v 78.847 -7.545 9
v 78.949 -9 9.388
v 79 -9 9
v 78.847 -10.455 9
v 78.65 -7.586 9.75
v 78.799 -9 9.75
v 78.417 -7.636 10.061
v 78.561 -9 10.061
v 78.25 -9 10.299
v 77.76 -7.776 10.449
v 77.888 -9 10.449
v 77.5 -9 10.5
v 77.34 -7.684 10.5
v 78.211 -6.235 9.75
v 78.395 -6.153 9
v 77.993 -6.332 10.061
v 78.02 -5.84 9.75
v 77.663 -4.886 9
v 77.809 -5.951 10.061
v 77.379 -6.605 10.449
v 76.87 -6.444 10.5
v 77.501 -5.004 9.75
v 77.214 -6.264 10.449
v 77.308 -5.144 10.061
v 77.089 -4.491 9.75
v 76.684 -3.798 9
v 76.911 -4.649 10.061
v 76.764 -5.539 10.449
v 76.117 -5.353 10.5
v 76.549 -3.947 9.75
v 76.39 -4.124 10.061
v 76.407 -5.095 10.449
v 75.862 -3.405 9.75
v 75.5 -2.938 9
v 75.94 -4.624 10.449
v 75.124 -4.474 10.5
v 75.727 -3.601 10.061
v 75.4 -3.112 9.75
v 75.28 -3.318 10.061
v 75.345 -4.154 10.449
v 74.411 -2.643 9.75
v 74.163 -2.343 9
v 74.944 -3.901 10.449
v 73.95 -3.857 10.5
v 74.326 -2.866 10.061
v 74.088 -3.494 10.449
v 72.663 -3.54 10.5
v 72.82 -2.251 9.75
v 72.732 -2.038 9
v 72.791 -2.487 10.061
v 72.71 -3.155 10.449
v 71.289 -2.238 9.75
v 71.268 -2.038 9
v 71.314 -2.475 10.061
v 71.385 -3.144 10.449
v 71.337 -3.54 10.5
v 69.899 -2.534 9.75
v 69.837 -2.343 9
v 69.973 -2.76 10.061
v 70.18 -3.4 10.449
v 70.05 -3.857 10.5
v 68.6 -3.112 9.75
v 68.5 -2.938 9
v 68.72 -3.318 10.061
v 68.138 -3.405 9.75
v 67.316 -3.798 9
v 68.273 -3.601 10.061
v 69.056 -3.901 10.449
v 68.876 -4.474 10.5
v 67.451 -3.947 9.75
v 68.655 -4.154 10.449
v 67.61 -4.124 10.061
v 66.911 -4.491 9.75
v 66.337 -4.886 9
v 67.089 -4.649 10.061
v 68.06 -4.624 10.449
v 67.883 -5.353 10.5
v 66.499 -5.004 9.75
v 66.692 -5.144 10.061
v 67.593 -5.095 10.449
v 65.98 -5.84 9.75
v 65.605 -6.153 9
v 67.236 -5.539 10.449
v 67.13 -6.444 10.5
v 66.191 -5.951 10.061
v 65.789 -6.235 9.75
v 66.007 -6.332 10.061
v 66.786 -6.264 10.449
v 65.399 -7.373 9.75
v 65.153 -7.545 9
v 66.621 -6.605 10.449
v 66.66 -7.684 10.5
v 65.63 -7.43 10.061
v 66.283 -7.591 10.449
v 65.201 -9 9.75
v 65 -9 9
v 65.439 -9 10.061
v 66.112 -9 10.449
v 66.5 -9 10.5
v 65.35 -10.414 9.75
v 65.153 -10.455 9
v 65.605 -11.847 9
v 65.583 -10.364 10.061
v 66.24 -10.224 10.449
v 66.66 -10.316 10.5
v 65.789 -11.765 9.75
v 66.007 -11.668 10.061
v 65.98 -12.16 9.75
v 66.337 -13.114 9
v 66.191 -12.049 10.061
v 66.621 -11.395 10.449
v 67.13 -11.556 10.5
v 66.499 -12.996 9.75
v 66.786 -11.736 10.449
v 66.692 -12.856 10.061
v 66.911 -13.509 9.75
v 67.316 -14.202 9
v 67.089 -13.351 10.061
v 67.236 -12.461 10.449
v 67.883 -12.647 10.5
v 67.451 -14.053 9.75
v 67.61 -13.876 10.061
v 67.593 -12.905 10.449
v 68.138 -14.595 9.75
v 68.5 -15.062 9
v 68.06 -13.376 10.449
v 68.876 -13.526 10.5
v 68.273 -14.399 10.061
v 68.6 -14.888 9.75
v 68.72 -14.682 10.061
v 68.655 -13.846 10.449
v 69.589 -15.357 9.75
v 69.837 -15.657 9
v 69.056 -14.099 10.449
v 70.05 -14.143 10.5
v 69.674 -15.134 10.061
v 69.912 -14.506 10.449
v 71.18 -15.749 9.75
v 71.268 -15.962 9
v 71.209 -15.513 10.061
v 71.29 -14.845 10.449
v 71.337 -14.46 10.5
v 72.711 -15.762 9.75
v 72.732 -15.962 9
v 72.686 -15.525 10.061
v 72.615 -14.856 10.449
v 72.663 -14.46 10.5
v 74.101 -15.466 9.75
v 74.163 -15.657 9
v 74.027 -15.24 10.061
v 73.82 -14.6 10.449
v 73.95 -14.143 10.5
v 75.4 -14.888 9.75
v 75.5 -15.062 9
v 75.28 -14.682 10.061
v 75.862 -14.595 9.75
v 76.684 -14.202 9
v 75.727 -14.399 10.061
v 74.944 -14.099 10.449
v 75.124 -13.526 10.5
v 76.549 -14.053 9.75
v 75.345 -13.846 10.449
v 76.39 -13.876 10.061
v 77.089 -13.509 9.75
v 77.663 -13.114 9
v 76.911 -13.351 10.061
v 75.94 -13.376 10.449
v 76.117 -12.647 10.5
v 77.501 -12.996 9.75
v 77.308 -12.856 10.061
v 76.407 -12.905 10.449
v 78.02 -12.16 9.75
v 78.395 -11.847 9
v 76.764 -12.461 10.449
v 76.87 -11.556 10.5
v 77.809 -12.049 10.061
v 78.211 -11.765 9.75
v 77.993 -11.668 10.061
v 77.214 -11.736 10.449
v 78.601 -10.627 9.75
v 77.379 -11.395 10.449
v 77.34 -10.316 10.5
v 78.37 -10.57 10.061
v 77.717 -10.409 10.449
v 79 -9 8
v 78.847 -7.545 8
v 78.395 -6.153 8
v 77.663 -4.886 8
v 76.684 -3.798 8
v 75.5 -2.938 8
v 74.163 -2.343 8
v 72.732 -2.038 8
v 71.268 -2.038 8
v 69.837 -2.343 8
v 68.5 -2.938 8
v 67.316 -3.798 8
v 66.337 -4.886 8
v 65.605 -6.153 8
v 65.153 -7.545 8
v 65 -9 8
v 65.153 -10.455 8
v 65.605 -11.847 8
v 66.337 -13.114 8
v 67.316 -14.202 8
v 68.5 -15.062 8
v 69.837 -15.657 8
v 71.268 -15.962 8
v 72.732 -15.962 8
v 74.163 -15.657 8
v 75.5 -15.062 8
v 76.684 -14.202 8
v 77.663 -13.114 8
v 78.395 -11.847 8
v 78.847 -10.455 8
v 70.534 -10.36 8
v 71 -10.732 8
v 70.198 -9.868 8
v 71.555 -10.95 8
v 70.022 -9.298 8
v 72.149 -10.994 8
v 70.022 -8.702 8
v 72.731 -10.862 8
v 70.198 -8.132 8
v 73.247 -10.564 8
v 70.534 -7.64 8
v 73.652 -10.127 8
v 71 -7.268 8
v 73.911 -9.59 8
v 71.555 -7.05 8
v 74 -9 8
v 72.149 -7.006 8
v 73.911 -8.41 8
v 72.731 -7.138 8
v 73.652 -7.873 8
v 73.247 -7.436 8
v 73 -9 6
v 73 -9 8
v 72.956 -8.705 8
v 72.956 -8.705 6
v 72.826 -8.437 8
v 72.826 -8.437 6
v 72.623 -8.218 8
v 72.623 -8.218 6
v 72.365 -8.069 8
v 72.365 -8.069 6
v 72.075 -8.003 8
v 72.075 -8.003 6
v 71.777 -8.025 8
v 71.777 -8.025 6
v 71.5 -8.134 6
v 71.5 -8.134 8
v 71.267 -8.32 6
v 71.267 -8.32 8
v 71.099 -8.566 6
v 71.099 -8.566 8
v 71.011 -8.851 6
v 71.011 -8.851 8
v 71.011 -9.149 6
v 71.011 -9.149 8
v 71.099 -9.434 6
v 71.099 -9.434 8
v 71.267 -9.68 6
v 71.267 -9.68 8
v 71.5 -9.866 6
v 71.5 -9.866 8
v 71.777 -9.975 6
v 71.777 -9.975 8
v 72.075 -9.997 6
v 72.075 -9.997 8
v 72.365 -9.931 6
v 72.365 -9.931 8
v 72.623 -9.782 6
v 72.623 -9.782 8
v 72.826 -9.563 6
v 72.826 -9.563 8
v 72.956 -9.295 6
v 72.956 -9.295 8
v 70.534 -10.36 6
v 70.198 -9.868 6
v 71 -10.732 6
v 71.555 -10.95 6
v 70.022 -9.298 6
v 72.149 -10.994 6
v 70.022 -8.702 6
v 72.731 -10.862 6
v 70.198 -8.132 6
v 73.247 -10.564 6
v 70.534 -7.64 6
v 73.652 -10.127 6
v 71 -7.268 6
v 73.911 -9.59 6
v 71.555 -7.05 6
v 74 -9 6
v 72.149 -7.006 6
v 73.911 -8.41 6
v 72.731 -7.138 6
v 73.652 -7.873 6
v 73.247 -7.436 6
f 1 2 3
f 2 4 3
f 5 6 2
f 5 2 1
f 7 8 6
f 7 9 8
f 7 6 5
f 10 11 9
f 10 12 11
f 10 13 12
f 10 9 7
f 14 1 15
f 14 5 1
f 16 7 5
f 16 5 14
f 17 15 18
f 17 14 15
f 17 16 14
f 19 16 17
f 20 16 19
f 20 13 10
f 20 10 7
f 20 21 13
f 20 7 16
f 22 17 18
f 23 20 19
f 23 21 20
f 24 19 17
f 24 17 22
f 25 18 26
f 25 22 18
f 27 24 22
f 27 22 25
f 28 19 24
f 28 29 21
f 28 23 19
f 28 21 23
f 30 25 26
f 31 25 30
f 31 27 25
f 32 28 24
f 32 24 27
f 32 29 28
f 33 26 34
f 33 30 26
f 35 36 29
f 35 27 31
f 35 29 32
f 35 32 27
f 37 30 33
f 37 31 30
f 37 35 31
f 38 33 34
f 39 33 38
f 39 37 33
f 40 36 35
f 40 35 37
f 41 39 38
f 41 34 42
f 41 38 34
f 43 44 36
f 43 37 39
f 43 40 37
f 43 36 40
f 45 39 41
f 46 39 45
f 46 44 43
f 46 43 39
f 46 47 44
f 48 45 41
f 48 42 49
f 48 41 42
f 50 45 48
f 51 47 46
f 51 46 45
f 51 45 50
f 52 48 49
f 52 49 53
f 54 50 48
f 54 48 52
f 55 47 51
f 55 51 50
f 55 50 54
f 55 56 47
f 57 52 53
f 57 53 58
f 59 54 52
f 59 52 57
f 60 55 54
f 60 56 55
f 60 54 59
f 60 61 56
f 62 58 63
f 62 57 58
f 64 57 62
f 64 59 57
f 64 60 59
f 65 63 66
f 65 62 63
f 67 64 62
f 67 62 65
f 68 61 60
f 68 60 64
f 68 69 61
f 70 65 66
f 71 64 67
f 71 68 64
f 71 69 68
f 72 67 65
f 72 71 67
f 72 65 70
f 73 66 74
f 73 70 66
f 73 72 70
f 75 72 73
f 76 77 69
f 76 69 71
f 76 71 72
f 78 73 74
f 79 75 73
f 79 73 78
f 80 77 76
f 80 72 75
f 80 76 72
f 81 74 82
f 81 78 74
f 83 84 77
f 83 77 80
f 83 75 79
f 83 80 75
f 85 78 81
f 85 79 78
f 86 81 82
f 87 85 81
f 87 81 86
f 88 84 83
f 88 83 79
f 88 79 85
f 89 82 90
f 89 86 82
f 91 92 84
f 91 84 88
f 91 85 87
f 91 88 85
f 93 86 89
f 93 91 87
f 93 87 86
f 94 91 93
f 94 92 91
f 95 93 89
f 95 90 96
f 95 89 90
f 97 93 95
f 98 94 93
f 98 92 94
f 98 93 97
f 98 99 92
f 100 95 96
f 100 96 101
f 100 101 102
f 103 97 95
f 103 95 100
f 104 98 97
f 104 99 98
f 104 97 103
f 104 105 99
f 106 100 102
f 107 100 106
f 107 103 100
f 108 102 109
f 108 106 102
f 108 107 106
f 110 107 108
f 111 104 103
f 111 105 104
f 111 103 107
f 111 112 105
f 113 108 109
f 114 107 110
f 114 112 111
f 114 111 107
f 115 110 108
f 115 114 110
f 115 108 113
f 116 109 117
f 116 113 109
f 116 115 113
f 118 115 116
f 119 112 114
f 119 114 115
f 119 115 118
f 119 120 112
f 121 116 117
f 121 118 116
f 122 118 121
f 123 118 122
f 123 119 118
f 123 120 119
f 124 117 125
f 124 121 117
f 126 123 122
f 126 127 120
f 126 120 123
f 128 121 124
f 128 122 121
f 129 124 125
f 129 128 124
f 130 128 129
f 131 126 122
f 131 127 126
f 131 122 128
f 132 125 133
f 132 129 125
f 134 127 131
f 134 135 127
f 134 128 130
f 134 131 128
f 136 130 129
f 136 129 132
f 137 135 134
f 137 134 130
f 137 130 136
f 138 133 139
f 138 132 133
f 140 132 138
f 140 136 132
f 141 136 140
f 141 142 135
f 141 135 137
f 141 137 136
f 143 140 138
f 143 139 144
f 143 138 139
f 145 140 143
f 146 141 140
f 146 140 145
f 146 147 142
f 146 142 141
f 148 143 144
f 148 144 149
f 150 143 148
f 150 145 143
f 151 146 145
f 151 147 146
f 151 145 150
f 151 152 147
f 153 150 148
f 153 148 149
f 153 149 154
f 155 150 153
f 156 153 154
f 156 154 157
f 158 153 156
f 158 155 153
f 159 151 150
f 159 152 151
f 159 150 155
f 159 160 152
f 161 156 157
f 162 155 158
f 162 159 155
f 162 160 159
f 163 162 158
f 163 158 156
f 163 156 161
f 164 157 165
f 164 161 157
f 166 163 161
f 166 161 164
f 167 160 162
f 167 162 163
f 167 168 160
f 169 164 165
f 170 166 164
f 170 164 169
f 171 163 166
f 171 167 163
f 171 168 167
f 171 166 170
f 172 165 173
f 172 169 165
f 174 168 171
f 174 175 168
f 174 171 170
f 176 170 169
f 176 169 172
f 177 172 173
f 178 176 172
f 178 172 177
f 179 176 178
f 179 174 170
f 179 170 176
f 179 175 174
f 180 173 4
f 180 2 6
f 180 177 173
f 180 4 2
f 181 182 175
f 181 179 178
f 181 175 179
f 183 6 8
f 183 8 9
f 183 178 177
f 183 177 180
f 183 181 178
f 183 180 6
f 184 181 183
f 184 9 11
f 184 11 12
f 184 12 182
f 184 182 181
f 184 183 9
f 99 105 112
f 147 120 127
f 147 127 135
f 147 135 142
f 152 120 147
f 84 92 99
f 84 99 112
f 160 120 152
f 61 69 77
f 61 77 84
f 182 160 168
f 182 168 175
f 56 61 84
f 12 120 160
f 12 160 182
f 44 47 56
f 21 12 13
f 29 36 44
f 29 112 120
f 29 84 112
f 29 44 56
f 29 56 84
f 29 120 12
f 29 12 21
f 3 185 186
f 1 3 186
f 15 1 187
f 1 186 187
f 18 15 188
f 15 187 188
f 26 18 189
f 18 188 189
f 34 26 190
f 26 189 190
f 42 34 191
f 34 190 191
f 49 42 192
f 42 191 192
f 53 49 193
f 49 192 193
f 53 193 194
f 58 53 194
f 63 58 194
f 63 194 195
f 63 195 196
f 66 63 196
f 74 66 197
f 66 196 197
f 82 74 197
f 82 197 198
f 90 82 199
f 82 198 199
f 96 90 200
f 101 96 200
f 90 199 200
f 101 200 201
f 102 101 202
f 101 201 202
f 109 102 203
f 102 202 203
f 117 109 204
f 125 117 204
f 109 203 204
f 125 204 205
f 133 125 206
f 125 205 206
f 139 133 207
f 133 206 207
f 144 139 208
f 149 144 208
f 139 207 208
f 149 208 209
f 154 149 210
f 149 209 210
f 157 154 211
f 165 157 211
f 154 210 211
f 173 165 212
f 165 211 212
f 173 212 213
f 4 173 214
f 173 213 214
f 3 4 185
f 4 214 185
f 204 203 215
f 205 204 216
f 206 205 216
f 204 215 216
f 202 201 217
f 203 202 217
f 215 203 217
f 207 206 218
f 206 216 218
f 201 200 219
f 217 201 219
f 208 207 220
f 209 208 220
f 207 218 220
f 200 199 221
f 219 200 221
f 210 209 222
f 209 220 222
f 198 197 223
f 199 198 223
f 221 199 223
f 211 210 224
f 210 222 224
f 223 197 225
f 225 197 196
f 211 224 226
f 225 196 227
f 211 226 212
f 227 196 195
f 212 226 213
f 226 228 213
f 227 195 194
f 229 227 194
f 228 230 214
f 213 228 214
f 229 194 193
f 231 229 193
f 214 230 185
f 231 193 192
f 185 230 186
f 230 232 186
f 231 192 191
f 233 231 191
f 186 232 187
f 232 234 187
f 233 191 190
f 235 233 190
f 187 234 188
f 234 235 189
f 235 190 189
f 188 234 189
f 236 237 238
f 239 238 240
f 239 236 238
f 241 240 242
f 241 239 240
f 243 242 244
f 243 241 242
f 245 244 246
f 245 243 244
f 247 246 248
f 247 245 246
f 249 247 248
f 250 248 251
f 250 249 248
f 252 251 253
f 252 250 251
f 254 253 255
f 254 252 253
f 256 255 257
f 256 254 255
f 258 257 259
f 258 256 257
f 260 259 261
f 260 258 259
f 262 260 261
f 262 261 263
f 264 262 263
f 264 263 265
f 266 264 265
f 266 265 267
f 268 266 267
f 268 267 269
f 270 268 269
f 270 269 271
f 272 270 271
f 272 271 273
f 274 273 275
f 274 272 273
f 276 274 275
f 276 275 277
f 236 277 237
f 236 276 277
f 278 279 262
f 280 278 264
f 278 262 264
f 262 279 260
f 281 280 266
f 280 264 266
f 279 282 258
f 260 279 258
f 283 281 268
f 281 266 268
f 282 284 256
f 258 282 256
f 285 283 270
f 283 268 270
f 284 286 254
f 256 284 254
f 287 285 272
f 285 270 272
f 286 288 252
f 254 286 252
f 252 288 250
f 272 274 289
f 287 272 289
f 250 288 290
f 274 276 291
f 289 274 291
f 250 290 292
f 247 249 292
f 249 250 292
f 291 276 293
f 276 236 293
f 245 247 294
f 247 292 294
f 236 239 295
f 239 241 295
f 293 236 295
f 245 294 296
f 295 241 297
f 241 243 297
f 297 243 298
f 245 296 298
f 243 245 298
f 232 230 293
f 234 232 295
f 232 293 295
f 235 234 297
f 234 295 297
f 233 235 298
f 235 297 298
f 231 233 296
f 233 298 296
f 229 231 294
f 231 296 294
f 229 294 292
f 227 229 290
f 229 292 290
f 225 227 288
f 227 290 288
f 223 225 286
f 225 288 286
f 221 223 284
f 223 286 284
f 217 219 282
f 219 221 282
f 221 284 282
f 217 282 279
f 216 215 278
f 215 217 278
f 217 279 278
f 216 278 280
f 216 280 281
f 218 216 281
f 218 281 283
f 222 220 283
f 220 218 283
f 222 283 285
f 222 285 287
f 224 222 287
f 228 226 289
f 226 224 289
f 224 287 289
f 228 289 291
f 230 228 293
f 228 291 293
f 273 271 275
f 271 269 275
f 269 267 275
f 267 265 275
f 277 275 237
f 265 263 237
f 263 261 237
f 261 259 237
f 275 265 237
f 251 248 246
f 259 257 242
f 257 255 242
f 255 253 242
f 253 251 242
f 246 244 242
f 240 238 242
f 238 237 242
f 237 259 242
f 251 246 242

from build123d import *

# Parameters (mm, degrees)
CYLINDER085_R     = 1
CYLINDER085_DEPTH = 3.5
CYLINDER087_R     = 2
CYLINDER087_DEPTH = 3.5
CYLINDER086_R     = 7
CYLINDER086_DEPTH = 2.5
FILLET054_R       = 1.5


with BuildPart() as cylinder166:
    # Cylinder085 → Cylinder085 (new body)
    with BuildSketch(Plane(origin=(46, -9, 6), x_dir=(1, 0, 0), z_dir=(0, 0, 1))):
        Circle(CYLINDER085_R)
    extrude(amount=CYLINDER085_DEPTH)


with BuildPart() as cut111:
    # Cylinder087 → Cylinder087 (new body)
    with BuildSketch(Plane(origin=(46, -9, 6), x_dir=(1, 0, 0), z_dir=(0, 0, 1))):
        Circle(CYLINDER087_R)
    extrude(amount=CYLINDER087_DEPTH)

    # Cut111: cut Cylinder166
    add(cylinder166.part, mode=Mode.SUBTRACT)


with BuildPart() as fusion066:
    # Cylinder086 → Cylinder086 (new body)
    with BuildSketch(Plane(origin=(46, -9, 8), x_dir=(1, 0, 0), z_dir=(0, 0, 1))):
        Circle(CYLINDER086_R)
    extrude(amount=CYLINDER086_DEPTH)

    # Fillet054
    fillet054_edges = [fusion066.edges().sort_by_distance(p)[0] for p in [
        (39, -9, 10.5),
    ]]
    fillet(fillet054_edges, radius=FILLET054_R)

    # Fusion066: union Cut111
    add(cut111.part)


with BuildPart() as fusion066_1:
    # Fusion066 placement: moved
    add(fusion066.part.moved(Location((26, 0, 0))))


solid = fusion066_1.part
